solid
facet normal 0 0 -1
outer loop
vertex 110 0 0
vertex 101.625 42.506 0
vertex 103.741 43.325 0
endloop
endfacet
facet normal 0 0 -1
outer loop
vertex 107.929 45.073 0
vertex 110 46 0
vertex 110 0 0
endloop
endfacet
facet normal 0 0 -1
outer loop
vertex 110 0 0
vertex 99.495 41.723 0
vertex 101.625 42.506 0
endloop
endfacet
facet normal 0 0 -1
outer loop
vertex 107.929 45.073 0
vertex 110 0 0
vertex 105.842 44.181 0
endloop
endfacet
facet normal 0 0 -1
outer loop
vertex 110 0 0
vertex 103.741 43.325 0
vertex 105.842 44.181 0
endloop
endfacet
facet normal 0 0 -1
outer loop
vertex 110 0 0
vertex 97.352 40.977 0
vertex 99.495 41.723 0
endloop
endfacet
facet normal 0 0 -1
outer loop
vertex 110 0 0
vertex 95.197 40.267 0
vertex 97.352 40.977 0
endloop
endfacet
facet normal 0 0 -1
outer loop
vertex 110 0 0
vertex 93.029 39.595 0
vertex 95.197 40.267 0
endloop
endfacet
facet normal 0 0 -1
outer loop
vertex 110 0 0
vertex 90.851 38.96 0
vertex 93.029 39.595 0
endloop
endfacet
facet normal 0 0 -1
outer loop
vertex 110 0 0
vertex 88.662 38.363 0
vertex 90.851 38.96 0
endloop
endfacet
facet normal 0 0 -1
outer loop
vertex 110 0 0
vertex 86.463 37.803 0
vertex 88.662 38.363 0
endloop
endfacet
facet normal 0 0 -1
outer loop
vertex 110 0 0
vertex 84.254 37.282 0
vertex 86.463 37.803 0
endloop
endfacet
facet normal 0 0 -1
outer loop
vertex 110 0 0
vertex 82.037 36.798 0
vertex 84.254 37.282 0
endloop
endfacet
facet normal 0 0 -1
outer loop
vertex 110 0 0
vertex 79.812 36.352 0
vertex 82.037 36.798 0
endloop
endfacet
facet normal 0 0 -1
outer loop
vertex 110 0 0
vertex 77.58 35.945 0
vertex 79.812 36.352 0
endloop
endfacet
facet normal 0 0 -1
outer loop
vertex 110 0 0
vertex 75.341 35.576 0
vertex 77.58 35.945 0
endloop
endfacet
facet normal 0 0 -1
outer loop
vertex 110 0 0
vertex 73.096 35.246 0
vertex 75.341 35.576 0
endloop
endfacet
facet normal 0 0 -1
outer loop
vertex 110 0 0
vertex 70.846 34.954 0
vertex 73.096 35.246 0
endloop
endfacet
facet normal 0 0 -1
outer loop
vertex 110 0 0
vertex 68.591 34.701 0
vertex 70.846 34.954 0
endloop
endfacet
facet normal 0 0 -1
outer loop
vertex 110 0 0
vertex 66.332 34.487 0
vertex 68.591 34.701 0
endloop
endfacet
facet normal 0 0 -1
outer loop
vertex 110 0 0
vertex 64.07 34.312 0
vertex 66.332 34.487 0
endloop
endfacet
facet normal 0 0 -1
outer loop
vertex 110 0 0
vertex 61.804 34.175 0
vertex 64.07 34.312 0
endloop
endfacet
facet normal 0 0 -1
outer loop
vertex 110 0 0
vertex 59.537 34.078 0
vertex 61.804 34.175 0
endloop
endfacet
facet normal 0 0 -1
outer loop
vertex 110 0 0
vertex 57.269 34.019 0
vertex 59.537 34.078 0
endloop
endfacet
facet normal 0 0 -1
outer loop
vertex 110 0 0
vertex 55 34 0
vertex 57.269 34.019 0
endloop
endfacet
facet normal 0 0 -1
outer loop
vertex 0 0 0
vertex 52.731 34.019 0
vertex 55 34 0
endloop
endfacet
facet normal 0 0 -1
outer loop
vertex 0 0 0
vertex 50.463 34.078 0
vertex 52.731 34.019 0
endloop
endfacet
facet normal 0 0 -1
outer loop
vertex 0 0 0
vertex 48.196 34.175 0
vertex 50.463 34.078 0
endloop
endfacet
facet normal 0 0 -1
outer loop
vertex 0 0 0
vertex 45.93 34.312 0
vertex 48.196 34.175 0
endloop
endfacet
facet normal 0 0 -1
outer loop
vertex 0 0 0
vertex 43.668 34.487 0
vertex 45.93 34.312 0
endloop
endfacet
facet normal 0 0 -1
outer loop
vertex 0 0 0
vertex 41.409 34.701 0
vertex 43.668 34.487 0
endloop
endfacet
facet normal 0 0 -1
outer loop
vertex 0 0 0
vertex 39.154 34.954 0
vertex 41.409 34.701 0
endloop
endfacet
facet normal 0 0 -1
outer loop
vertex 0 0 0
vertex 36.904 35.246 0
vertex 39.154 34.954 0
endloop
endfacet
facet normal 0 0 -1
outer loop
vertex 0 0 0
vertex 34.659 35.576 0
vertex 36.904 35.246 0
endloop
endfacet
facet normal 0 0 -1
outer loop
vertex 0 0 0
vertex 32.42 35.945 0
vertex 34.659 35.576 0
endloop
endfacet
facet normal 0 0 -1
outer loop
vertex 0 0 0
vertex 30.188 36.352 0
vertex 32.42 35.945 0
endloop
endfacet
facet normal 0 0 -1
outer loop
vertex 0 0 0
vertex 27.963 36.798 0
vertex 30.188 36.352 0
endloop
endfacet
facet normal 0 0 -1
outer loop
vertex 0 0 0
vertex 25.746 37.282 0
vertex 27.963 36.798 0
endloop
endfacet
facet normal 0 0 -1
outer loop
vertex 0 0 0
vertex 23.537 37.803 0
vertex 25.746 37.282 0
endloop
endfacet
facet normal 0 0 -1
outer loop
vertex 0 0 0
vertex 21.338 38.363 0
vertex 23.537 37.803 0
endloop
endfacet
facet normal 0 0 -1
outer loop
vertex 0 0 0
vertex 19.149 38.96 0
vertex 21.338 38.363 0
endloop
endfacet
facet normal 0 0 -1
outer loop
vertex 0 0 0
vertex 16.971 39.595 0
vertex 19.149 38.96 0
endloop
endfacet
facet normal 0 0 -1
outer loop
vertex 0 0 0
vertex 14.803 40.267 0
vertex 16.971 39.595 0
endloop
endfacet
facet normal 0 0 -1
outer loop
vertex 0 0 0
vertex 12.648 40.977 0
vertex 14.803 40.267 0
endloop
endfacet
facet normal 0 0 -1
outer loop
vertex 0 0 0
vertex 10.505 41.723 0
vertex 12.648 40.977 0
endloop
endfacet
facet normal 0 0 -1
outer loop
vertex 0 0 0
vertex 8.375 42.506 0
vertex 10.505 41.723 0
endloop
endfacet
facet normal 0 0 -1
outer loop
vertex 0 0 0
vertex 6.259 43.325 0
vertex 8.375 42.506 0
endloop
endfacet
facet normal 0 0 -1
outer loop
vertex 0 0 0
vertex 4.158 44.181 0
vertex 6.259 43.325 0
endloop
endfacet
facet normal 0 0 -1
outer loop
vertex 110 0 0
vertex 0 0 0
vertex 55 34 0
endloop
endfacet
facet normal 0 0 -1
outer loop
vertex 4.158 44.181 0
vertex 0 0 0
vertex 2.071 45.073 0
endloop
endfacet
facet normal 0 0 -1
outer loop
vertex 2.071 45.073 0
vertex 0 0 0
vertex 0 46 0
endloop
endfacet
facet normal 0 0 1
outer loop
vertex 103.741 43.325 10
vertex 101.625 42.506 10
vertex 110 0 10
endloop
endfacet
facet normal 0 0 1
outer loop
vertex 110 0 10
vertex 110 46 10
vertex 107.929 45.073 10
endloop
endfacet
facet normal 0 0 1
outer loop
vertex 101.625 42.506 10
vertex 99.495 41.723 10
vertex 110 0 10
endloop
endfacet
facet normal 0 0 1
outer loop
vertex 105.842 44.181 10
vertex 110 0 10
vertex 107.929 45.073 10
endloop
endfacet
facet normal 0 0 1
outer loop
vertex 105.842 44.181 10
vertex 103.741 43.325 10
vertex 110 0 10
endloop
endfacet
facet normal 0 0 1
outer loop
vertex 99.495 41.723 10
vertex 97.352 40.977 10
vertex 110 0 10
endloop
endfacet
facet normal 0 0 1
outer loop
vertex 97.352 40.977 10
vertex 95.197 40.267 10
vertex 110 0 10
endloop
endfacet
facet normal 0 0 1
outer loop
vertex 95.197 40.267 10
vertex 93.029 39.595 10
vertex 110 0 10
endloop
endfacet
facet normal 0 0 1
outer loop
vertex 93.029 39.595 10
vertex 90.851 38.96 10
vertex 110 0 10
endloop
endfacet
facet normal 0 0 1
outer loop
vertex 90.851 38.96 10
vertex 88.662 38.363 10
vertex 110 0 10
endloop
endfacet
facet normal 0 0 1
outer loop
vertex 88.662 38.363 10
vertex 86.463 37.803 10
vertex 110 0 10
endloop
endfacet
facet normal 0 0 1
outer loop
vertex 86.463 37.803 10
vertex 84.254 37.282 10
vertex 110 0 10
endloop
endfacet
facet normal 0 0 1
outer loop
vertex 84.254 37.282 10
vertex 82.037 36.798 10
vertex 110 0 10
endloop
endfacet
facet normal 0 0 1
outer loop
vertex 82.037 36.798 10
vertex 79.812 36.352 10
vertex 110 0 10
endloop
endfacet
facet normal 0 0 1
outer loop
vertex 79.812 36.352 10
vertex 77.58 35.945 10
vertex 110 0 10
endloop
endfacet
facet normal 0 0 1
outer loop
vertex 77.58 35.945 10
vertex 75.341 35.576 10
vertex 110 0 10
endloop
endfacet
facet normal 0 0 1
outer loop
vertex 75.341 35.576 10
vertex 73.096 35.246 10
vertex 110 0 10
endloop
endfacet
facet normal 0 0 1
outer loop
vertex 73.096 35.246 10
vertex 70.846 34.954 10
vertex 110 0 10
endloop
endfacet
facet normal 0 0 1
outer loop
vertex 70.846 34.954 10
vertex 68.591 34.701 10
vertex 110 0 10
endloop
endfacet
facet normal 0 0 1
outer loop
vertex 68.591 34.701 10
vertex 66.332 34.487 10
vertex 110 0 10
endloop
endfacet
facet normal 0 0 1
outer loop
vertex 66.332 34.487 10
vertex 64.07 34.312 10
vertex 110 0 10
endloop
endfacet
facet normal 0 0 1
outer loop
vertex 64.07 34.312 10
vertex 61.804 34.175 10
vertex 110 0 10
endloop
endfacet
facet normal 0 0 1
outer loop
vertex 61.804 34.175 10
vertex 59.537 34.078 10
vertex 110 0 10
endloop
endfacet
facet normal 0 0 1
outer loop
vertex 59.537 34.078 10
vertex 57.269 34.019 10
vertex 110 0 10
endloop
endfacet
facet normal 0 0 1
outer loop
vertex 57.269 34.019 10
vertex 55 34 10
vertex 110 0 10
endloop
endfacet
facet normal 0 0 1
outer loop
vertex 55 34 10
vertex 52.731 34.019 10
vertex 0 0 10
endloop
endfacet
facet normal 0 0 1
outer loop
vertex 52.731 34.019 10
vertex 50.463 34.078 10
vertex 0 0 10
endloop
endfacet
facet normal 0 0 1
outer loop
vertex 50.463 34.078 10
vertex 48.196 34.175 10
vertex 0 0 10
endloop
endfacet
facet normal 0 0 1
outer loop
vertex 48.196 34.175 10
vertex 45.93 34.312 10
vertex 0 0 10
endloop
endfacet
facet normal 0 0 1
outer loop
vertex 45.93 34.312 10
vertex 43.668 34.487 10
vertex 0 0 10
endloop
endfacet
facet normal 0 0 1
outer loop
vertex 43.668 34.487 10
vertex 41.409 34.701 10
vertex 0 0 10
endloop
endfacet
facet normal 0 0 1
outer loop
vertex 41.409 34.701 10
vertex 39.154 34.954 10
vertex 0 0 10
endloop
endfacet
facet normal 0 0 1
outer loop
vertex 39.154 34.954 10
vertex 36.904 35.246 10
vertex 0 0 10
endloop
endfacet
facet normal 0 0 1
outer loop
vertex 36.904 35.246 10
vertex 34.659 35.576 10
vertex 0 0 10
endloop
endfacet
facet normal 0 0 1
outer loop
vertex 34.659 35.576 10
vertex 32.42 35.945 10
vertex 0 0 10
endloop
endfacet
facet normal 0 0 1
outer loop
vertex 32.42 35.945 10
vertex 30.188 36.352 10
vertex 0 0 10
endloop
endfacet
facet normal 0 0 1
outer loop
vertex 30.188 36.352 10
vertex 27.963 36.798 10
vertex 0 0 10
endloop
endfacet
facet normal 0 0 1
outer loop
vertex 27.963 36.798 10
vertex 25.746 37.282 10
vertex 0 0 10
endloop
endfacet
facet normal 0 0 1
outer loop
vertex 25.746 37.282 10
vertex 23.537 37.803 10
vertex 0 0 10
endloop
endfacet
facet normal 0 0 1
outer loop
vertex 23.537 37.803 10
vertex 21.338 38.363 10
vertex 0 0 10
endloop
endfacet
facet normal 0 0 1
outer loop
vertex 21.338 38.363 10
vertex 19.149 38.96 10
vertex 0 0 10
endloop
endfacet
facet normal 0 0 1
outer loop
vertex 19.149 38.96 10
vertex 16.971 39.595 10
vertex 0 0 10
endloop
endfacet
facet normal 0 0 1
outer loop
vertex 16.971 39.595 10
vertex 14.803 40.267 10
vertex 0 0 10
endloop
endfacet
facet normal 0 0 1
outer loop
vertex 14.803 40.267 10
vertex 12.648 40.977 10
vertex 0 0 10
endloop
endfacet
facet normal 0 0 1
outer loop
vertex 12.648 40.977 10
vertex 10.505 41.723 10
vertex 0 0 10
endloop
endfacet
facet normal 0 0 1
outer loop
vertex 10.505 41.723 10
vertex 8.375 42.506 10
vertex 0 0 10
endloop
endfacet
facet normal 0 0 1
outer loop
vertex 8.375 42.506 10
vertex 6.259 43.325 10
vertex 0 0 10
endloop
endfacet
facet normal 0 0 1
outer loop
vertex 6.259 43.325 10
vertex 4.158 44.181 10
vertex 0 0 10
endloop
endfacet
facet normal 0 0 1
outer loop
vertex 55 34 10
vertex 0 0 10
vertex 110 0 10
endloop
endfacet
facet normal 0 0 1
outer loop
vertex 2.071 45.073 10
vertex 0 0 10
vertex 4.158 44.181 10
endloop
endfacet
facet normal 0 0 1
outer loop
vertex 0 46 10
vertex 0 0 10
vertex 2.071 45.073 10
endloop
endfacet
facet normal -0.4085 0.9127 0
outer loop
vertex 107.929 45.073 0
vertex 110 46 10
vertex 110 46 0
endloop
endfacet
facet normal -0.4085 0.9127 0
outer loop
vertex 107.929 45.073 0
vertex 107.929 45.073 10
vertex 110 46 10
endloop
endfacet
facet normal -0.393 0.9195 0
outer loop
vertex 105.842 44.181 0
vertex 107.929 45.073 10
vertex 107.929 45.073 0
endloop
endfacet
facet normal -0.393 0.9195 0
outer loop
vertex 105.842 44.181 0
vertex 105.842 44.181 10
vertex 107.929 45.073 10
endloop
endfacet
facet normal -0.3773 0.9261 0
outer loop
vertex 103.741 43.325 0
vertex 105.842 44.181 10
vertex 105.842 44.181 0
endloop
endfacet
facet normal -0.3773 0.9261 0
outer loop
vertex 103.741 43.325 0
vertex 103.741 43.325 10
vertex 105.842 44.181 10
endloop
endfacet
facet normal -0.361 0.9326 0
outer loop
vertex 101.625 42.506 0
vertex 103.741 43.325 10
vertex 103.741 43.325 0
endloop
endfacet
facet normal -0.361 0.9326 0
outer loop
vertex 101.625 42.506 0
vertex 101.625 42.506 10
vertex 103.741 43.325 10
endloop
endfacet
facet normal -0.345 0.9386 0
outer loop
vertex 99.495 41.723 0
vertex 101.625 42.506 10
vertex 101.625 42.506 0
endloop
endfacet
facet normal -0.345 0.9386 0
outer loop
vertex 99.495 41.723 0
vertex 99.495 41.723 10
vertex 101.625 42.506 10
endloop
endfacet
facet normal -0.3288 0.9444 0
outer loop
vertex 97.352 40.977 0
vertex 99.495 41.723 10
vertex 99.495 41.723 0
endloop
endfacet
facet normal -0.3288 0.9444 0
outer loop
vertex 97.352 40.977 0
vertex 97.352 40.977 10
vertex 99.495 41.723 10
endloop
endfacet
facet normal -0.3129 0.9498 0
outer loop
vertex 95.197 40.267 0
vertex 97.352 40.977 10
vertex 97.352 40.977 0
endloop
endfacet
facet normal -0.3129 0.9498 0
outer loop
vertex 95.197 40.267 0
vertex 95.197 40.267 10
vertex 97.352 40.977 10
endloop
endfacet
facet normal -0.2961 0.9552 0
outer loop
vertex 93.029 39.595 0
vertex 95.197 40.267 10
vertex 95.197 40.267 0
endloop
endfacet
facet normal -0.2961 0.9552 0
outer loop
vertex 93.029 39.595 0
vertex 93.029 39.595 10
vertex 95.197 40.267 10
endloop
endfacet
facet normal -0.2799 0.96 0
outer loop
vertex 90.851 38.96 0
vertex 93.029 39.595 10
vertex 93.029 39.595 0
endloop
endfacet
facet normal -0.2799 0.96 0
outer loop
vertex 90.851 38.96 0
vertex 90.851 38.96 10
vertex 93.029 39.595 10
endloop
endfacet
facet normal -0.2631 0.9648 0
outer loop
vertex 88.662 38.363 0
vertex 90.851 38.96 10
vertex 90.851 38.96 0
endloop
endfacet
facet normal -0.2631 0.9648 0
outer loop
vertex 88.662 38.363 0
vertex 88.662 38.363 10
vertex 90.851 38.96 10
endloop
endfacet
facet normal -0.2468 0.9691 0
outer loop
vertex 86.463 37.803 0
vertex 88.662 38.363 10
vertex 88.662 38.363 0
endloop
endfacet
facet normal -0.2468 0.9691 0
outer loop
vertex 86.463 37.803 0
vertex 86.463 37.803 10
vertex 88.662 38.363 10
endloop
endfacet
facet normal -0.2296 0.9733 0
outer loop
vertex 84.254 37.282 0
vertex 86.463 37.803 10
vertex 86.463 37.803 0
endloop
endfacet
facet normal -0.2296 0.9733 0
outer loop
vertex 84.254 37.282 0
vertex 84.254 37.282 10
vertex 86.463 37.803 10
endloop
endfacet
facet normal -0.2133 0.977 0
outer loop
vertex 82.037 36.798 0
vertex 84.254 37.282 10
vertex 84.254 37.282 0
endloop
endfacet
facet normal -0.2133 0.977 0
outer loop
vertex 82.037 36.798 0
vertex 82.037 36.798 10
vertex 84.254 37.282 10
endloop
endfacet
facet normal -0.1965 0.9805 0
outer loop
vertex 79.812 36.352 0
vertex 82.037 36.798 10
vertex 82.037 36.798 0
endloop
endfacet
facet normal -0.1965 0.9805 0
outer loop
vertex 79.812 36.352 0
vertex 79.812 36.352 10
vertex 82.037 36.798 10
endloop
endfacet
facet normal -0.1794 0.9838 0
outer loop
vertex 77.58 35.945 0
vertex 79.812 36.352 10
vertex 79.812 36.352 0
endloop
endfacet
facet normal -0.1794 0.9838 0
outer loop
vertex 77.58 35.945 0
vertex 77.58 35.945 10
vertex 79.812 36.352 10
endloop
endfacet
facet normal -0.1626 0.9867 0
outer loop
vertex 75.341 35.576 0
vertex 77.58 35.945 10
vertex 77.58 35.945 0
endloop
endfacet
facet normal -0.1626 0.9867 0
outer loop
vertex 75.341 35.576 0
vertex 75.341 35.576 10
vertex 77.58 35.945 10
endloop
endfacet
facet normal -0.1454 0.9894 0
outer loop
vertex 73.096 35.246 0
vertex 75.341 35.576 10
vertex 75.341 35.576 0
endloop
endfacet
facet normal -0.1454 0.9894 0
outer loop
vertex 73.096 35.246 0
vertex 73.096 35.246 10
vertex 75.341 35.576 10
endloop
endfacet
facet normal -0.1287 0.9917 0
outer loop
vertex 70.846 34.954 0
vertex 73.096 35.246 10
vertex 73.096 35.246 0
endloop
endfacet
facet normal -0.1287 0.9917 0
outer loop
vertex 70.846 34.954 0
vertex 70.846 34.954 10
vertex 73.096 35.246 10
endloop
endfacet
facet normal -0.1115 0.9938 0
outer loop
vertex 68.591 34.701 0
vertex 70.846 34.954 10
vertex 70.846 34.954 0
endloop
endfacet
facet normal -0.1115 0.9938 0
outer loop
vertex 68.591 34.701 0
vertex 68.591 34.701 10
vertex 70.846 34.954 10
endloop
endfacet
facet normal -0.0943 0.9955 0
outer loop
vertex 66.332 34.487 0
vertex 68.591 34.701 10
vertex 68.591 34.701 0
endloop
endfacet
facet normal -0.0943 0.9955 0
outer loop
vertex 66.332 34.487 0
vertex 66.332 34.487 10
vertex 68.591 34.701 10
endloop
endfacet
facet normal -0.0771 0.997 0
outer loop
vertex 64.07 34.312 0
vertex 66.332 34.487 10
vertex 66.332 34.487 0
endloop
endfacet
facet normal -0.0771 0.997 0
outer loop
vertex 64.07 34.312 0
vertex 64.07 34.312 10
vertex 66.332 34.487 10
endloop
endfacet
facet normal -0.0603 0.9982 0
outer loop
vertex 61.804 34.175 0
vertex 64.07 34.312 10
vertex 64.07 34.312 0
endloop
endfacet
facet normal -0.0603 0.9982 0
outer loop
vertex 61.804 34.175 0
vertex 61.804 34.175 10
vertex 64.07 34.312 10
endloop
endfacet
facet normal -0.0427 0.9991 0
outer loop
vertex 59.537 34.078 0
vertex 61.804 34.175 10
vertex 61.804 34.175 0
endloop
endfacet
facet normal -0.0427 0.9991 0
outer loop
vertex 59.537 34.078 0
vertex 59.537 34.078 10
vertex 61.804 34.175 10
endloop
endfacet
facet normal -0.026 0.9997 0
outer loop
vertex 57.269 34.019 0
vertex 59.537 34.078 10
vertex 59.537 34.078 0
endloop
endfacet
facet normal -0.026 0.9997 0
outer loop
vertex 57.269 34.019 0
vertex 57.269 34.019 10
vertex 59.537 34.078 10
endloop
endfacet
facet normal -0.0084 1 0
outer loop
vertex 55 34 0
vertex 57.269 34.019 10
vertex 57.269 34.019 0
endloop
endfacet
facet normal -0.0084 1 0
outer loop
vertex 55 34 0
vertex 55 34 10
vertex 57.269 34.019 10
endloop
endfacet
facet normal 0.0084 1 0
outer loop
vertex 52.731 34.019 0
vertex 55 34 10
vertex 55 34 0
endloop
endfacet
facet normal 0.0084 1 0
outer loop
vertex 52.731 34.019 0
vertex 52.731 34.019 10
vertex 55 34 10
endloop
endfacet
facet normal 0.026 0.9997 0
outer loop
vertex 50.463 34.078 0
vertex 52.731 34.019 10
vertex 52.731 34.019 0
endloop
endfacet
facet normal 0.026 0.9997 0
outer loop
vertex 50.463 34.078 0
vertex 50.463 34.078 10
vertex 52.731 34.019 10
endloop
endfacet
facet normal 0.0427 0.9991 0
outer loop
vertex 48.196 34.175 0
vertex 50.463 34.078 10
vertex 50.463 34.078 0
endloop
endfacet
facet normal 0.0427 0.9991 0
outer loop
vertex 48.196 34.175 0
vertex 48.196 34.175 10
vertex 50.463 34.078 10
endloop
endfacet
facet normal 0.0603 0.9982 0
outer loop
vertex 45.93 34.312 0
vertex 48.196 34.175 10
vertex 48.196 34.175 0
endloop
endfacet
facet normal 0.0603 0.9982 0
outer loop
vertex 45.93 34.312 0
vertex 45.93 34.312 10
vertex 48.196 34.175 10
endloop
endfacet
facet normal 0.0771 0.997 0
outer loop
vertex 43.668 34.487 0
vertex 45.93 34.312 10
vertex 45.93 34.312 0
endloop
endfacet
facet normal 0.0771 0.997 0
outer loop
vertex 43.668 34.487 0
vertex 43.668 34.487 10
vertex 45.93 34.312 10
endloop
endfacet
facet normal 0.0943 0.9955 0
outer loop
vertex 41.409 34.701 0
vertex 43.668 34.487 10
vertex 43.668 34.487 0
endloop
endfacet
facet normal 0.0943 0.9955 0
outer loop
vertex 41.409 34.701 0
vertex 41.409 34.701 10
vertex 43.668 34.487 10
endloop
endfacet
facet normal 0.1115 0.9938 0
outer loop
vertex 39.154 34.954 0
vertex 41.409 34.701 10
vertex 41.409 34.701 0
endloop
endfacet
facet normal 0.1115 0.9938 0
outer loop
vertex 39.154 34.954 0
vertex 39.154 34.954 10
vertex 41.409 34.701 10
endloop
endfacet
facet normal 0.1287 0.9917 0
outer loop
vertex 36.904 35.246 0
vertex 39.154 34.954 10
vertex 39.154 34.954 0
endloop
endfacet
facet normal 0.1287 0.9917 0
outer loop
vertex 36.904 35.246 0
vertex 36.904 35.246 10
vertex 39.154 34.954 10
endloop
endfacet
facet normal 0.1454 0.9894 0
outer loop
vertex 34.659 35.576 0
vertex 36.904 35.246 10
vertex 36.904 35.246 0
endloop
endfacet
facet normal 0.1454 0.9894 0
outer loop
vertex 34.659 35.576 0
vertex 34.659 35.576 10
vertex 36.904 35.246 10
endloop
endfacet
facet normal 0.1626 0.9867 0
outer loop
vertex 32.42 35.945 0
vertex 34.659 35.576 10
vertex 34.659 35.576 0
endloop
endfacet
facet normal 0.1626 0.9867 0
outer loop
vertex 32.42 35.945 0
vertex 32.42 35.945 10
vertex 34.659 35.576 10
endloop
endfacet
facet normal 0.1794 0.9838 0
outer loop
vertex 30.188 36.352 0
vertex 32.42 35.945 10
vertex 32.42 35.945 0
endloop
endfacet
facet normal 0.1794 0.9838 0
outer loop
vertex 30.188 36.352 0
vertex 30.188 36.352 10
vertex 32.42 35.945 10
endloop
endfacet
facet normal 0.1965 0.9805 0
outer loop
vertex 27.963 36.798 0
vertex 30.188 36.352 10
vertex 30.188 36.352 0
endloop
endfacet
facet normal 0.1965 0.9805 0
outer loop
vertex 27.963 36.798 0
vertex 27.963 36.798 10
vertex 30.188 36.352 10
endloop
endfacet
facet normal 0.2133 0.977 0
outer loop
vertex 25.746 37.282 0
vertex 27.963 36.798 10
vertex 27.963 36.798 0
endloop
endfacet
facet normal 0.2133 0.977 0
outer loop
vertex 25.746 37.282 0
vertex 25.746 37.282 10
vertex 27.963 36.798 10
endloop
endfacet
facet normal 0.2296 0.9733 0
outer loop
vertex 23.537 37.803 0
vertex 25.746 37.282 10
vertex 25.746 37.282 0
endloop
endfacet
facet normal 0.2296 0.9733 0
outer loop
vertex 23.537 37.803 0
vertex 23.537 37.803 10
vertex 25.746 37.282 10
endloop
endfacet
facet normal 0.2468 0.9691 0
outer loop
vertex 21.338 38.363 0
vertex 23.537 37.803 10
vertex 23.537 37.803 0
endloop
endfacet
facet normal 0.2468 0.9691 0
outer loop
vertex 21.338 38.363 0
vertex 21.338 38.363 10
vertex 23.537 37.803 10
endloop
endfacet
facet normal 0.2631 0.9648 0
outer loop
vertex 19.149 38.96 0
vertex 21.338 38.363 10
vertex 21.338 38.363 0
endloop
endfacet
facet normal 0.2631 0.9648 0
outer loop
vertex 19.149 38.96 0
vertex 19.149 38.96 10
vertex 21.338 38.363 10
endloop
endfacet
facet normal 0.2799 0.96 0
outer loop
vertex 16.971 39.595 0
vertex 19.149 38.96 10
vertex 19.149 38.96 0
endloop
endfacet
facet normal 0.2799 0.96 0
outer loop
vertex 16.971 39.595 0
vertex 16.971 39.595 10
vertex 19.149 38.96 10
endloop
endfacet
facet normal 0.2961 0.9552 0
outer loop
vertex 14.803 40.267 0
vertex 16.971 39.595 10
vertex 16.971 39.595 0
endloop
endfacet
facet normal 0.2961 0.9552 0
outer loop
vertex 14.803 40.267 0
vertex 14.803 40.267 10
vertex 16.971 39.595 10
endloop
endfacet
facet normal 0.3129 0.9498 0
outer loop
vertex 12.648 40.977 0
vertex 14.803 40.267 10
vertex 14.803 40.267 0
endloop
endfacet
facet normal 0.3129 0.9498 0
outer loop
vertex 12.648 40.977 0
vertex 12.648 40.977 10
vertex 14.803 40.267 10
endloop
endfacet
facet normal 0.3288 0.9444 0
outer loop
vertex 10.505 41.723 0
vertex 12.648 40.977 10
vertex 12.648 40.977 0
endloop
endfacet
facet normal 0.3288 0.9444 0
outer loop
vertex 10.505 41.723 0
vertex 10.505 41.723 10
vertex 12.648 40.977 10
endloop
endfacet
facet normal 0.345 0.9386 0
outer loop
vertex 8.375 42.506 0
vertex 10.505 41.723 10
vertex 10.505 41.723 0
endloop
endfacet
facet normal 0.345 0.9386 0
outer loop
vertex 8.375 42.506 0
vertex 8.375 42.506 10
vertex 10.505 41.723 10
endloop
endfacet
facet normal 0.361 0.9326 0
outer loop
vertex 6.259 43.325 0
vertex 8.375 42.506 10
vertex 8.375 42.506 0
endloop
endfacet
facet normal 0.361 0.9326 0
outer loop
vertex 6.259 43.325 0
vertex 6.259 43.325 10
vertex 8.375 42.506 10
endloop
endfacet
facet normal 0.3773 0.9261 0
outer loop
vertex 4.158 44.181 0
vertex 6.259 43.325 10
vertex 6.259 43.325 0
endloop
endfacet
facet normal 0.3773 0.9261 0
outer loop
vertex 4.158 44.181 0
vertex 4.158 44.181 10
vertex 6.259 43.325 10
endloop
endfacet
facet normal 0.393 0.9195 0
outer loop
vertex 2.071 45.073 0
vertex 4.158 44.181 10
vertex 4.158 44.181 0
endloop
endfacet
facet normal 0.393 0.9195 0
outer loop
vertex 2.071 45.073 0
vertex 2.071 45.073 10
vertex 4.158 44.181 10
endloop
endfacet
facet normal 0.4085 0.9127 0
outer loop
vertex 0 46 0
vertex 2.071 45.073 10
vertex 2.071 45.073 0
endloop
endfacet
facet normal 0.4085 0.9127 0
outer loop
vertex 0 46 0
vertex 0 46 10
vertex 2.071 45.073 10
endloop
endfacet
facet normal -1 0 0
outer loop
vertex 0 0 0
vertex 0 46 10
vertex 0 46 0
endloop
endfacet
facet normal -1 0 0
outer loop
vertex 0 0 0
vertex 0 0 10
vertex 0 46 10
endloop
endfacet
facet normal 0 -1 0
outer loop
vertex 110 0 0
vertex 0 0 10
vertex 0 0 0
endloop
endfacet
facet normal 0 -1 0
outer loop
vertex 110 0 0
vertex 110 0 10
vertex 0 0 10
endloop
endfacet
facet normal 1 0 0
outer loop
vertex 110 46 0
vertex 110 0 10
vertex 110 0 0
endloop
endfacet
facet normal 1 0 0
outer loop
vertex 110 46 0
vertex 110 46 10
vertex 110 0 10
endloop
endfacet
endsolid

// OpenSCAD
$fn = 32;

// ----------------------------------------------------------------------
// Arc profile plate: notch, 53 points
// ----------------------------------------------------------------------

// --- parameters (mm) ---
bar_l = 110;              // bar length, X
bar_w = 46;               // bar width, Y
notch_depth = 12;         // depth of the arc notch at mid-span
arc_r = 132.04;           // radius of the notch arc
arc_angle = 49.23;        // notch arc angle, degrees
arc_step = 1;             // sampling step of the notch arc, degrees
plate_t = 10;             // plate thickness, Z

profile = [[0, 0], [110, 0], [110, 46], [107.929, 45.073], [105.842, 44.181], [103.741, 43.325], [101.625, 42.506], [99.495, 41.723], [97.352, 40.977], [95.197, 40.267], [93.029, 39.595], [90.851, 38.96], [88.662, 38.363], [86.463, 37.803], [84.254, 37.282], [82.037, 36.798], [79.812, 36.352], [77.58, 35.945], [75.341, 35.576], [73.096, 35.246], [70.846, 34.954], [68.591, 34.701], [66.332, 34.487], [64.07, 34.312], [61.804, 34.175], [59.537, 34.078], [57.269, 34.019], [55, 34], [52.731, 34.019], [50.463, 34.078], [48.196, 34.175], [45.93, 34.312], [43.668, 34.487], [41.409, 34.701], [39.154, 34.954], [36.904, 35.246], [34.659, 35.576], [32.42, 35.945], [30.188, 36.352], [27.963, 36.798], [25.746, 37.282], [23.537, 37.803], [21.338, 38.363], [19.149, 38.96], [16.971, 39.595], [14.803, 40.267], [12.648, 40.977], [10.505, 41.723], [8.375, 42.506], [6.259, 43.325], [4.158, 44.181], [2.071, 45.073], [0, 46]];  // primary outline, 53 points, counter clockwise

// --- the one profile operation ---
linear_extrude(height = plate_t) polygon(points = profile);
